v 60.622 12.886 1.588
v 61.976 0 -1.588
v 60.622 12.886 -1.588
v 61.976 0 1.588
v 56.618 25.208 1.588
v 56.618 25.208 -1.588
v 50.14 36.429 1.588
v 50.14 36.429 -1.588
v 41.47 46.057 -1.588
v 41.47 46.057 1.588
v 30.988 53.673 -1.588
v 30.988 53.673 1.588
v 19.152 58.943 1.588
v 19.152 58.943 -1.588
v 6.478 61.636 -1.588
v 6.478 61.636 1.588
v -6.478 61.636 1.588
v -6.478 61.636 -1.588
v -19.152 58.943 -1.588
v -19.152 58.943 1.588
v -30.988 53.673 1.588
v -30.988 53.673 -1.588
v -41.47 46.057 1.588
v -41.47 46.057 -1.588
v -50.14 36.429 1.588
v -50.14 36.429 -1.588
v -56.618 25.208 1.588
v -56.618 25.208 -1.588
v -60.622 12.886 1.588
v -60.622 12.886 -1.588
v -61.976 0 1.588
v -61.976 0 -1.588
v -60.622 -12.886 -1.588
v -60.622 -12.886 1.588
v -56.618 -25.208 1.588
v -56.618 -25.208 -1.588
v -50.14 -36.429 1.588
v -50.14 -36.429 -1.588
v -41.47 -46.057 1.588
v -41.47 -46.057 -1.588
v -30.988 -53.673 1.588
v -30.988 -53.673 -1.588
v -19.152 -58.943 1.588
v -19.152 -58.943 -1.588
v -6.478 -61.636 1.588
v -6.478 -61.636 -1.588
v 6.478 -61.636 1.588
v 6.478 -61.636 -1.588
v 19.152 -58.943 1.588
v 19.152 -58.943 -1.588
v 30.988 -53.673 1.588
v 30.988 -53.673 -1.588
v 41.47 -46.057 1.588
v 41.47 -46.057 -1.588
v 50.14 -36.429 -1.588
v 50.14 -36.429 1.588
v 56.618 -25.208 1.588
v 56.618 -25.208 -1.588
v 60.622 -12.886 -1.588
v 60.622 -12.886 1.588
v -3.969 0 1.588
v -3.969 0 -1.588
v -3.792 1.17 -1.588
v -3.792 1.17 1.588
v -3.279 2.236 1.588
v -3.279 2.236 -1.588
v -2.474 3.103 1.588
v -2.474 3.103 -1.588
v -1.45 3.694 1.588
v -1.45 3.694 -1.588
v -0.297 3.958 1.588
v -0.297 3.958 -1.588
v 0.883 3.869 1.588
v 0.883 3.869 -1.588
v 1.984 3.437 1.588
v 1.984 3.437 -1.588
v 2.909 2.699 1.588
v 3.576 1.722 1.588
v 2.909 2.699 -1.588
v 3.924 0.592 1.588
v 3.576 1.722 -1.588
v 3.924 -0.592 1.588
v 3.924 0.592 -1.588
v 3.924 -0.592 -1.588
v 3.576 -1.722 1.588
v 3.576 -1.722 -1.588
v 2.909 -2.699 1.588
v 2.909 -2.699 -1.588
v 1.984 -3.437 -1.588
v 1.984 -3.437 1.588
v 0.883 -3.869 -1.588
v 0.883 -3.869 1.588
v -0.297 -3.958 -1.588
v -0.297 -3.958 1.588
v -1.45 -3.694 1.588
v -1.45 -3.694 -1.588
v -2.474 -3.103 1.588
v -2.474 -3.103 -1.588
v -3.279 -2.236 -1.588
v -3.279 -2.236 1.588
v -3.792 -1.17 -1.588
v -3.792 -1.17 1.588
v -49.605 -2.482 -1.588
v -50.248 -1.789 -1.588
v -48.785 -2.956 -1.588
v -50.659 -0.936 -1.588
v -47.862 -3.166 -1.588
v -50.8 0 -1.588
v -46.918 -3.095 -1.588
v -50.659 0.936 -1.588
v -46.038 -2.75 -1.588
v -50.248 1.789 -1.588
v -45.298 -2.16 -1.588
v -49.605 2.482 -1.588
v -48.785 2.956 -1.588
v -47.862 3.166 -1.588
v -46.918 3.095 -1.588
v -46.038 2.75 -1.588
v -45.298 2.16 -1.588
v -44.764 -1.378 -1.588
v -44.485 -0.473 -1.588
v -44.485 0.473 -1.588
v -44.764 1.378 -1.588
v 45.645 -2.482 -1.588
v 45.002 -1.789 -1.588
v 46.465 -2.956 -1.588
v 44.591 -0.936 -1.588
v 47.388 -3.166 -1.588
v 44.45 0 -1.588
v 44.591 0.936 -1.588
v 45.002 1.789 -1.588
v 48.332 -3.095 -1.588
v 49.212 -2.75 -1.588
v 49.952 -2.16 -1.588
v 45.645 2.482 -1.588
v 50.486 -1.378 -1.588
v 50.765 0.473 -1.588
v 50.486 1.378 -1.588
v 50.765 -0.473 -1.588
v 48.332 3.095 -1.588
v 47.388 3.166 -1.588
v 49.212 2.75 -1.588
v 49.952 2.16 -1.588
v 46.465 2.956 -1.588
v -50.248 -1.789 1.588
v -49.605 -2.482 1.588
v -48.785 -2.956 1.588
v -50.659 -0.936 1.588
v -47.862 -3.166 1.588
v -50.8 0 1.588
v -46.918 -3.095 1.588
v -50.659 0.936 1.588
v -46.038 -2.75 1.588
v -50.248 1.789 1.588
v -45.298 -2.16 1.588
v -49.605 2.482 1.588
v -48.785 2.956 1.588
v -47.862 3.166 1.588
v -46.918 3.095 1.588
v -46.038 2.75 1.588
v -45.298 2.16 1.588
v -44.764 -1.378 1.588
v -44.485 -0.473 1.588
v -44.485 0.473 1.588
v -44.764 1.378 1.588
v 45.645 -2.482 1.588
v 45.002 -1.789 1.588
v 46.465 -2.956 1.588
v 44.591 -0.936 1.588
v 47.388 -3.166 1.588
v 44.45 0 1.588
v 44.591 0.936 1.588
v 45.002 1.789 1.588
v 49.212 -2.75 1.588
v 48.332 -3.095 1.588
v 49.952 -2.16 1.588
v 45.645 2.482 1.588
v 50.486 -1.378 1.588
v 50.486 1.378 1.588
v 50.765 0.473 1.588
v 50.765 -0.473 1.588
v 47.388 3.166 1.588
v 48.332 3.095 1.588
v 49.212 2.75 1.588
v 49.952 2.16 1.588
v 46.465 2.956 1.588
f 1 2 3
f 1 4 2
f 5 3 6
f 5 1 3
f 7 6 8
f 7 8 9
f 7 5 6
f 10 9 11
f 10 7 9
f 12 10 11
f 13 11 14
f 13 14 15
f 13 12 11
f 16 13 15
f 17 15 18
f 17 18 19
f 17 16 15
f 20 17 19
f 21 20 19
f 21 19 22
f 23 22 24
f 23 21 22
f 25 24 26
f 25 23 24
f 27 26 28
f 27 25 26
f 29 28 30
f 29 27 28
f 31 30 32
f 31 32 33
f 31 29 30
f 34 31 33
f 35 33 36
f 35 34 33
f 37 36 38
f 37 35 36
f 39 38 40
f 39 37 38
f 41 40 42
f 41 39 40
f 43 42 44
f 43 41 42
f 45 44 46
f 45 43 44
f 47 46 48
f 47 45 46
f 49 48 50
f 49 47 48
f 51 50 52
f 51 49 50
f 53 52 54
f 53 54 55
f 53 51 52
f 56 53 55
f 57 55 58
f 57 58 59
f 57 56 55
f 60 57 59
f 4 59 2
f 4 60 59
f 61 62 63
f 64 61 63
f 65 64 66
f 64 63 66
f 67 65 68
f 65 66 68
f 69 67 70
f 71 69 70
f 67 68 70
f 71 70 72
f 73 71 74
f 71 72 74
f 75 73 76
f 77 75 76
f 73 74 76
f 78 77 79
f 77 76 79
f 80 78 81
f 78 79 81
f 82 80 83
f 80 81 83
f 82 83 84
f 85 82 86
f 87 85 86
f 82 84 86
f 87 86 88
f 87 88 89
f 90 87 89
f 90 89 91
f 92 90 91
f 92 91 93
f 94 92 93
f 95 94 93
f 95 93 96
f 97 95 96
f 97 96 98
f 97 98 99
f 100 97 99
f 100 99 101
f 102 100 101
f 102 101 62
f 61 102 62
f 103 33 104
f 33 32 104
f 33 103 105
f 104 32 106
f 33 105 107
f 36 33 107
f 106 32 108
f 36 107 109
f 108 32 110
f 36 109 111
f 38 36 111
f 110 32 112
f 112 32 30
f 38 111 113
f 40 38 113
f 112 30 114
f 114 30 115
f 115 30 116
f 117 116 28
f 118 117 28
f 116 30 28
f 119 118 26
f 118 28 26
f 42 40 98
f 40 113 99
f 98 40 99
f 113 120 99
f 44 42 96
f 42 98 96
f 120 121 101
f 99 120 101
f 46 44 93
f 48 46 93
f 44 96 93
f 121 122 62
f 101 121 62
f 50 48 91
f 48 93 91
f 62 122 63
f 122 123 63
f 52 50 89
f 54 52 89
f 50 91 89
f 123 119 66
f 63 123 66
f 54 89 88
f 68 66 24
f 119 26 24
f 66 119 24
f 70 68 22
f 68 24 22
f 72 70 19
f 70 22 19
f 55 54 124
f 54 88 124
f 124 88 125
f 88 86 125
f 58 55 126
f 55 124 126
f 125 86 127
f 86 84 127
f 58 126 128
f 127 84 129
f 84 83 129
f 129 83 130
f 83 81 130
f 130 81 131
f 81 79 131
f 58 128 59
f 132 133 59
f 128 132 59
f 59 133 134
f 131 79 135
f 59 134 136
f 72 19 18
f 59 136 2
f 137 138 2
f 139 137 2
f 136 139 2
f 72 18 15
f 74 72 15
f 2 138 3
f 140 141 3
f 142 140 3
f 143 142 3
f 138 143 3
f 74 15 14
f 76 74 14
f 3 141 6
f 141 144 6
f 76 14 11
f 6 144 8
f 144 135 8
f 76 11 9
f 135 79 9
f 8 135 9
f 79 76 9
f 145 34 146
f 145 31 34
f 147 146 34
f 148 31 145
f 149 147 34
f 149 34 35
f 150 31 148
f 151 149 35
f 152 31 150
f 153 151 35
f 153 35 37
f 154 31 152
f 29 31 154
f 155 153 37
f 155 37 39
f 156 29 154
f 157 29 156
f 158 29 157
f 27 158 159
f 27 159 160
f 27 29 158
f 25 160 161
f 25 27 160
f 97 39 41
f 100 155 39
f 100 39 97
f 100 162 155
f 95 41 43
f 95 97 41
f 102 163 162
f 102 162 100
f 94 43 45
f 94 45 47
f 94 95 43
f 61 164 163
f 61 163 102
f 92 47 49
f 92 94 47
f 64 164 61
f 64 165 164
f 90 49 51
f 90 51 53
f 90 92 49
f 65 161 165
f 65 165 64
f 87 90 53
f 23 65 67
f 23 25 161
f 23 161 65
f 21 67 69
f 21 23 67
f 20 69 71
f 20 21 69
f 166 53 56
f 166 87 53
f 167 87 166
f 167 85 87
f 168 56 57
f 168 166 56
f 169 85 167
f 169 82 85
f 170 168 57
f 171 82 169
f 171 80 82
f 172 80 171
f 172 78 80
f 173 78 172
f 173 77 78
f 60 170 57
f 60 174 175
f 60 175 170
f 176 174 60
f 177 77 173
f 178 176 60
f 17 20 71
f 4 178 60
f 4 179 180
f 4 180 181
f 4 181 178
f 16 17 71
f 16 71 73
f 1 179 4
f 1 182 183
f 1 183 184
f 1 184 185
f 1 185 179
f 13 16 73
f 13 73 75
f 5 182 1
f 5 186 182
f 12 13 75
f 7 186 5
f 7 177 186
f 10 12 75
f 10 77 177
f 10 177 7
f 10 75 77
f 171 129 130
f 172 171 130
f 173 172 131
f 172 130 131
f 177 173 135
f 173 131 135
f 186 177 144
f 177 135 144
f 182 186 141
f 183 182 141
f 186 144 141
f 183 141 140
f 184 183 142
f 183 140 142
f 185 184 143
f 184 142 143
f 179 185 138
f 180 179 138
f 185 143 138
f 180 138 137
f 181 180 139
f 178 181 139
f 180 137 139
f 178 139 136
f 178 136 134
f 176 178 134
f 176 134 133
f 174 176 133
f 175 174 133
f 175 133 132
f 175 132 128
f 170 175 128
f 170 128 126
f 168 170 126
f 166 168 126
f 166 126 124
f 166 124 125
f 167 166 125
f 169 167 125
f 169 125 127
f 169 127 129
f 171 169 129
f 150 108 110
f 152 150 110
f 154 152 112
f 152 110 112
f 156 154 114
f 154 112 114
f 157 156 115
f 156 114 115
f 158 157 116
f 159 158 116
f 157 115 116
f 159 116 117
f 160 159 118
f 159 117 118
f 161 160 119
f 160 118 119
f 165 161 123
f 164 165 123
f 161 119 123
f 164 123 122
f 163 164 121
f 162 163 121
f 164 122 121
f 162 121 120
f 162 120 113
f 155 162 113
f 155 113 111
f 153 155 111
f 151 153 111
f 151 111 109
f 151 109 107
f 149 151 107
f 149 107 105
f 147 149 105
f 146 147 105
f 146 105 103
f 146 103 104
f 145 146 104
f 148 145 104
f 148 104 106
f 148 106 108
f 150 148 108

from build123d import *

# Parameters (mm, degrees)
SKETCH1_R                          = 61.976
BOSS_EXTRUDE1_DEPTH                = 1.5875
F_1_4_0_25_DIAMETER_HOLE1_D        = 6.35
F_5_16_0_3125_DIAMETER_HOLE1_D     = 7.9375
F_5_16_0_3125_DIAMETER_HOLE1_DEPTH = 3.302


with BuildPart() as part:
    # Sketch1 → Boss-Extrude1 (new body, symmetric)
    with BuildSketch(Plane.XY):
        Circle(SKETCH1_R)
    extrude(amount=BOSS_EXTRUDE1_DEPTH, both=True)

    # 1/4 (0.25) Diameter Hole1 (through all)
    with Locations(Plane.XY.offset(1.5875)):
        with Locations((-47.625, 0), (47.625, 0)):
            Hole(F_1_4_0_25_DIAMETER_HOLE1_D / 2)

    # 5/16 (0.3125) Diameter Hole1
    with Locations(Plane.XY.offset(1.5875)):
        with Locations((0, 0)):
            Hole(F_5_16_0_3125_DIAMETER_HOLE1_D / 2, depth=F_5_16_0_3125_DIAMETER_HOLE1_DEPTH)


solid = part.part
